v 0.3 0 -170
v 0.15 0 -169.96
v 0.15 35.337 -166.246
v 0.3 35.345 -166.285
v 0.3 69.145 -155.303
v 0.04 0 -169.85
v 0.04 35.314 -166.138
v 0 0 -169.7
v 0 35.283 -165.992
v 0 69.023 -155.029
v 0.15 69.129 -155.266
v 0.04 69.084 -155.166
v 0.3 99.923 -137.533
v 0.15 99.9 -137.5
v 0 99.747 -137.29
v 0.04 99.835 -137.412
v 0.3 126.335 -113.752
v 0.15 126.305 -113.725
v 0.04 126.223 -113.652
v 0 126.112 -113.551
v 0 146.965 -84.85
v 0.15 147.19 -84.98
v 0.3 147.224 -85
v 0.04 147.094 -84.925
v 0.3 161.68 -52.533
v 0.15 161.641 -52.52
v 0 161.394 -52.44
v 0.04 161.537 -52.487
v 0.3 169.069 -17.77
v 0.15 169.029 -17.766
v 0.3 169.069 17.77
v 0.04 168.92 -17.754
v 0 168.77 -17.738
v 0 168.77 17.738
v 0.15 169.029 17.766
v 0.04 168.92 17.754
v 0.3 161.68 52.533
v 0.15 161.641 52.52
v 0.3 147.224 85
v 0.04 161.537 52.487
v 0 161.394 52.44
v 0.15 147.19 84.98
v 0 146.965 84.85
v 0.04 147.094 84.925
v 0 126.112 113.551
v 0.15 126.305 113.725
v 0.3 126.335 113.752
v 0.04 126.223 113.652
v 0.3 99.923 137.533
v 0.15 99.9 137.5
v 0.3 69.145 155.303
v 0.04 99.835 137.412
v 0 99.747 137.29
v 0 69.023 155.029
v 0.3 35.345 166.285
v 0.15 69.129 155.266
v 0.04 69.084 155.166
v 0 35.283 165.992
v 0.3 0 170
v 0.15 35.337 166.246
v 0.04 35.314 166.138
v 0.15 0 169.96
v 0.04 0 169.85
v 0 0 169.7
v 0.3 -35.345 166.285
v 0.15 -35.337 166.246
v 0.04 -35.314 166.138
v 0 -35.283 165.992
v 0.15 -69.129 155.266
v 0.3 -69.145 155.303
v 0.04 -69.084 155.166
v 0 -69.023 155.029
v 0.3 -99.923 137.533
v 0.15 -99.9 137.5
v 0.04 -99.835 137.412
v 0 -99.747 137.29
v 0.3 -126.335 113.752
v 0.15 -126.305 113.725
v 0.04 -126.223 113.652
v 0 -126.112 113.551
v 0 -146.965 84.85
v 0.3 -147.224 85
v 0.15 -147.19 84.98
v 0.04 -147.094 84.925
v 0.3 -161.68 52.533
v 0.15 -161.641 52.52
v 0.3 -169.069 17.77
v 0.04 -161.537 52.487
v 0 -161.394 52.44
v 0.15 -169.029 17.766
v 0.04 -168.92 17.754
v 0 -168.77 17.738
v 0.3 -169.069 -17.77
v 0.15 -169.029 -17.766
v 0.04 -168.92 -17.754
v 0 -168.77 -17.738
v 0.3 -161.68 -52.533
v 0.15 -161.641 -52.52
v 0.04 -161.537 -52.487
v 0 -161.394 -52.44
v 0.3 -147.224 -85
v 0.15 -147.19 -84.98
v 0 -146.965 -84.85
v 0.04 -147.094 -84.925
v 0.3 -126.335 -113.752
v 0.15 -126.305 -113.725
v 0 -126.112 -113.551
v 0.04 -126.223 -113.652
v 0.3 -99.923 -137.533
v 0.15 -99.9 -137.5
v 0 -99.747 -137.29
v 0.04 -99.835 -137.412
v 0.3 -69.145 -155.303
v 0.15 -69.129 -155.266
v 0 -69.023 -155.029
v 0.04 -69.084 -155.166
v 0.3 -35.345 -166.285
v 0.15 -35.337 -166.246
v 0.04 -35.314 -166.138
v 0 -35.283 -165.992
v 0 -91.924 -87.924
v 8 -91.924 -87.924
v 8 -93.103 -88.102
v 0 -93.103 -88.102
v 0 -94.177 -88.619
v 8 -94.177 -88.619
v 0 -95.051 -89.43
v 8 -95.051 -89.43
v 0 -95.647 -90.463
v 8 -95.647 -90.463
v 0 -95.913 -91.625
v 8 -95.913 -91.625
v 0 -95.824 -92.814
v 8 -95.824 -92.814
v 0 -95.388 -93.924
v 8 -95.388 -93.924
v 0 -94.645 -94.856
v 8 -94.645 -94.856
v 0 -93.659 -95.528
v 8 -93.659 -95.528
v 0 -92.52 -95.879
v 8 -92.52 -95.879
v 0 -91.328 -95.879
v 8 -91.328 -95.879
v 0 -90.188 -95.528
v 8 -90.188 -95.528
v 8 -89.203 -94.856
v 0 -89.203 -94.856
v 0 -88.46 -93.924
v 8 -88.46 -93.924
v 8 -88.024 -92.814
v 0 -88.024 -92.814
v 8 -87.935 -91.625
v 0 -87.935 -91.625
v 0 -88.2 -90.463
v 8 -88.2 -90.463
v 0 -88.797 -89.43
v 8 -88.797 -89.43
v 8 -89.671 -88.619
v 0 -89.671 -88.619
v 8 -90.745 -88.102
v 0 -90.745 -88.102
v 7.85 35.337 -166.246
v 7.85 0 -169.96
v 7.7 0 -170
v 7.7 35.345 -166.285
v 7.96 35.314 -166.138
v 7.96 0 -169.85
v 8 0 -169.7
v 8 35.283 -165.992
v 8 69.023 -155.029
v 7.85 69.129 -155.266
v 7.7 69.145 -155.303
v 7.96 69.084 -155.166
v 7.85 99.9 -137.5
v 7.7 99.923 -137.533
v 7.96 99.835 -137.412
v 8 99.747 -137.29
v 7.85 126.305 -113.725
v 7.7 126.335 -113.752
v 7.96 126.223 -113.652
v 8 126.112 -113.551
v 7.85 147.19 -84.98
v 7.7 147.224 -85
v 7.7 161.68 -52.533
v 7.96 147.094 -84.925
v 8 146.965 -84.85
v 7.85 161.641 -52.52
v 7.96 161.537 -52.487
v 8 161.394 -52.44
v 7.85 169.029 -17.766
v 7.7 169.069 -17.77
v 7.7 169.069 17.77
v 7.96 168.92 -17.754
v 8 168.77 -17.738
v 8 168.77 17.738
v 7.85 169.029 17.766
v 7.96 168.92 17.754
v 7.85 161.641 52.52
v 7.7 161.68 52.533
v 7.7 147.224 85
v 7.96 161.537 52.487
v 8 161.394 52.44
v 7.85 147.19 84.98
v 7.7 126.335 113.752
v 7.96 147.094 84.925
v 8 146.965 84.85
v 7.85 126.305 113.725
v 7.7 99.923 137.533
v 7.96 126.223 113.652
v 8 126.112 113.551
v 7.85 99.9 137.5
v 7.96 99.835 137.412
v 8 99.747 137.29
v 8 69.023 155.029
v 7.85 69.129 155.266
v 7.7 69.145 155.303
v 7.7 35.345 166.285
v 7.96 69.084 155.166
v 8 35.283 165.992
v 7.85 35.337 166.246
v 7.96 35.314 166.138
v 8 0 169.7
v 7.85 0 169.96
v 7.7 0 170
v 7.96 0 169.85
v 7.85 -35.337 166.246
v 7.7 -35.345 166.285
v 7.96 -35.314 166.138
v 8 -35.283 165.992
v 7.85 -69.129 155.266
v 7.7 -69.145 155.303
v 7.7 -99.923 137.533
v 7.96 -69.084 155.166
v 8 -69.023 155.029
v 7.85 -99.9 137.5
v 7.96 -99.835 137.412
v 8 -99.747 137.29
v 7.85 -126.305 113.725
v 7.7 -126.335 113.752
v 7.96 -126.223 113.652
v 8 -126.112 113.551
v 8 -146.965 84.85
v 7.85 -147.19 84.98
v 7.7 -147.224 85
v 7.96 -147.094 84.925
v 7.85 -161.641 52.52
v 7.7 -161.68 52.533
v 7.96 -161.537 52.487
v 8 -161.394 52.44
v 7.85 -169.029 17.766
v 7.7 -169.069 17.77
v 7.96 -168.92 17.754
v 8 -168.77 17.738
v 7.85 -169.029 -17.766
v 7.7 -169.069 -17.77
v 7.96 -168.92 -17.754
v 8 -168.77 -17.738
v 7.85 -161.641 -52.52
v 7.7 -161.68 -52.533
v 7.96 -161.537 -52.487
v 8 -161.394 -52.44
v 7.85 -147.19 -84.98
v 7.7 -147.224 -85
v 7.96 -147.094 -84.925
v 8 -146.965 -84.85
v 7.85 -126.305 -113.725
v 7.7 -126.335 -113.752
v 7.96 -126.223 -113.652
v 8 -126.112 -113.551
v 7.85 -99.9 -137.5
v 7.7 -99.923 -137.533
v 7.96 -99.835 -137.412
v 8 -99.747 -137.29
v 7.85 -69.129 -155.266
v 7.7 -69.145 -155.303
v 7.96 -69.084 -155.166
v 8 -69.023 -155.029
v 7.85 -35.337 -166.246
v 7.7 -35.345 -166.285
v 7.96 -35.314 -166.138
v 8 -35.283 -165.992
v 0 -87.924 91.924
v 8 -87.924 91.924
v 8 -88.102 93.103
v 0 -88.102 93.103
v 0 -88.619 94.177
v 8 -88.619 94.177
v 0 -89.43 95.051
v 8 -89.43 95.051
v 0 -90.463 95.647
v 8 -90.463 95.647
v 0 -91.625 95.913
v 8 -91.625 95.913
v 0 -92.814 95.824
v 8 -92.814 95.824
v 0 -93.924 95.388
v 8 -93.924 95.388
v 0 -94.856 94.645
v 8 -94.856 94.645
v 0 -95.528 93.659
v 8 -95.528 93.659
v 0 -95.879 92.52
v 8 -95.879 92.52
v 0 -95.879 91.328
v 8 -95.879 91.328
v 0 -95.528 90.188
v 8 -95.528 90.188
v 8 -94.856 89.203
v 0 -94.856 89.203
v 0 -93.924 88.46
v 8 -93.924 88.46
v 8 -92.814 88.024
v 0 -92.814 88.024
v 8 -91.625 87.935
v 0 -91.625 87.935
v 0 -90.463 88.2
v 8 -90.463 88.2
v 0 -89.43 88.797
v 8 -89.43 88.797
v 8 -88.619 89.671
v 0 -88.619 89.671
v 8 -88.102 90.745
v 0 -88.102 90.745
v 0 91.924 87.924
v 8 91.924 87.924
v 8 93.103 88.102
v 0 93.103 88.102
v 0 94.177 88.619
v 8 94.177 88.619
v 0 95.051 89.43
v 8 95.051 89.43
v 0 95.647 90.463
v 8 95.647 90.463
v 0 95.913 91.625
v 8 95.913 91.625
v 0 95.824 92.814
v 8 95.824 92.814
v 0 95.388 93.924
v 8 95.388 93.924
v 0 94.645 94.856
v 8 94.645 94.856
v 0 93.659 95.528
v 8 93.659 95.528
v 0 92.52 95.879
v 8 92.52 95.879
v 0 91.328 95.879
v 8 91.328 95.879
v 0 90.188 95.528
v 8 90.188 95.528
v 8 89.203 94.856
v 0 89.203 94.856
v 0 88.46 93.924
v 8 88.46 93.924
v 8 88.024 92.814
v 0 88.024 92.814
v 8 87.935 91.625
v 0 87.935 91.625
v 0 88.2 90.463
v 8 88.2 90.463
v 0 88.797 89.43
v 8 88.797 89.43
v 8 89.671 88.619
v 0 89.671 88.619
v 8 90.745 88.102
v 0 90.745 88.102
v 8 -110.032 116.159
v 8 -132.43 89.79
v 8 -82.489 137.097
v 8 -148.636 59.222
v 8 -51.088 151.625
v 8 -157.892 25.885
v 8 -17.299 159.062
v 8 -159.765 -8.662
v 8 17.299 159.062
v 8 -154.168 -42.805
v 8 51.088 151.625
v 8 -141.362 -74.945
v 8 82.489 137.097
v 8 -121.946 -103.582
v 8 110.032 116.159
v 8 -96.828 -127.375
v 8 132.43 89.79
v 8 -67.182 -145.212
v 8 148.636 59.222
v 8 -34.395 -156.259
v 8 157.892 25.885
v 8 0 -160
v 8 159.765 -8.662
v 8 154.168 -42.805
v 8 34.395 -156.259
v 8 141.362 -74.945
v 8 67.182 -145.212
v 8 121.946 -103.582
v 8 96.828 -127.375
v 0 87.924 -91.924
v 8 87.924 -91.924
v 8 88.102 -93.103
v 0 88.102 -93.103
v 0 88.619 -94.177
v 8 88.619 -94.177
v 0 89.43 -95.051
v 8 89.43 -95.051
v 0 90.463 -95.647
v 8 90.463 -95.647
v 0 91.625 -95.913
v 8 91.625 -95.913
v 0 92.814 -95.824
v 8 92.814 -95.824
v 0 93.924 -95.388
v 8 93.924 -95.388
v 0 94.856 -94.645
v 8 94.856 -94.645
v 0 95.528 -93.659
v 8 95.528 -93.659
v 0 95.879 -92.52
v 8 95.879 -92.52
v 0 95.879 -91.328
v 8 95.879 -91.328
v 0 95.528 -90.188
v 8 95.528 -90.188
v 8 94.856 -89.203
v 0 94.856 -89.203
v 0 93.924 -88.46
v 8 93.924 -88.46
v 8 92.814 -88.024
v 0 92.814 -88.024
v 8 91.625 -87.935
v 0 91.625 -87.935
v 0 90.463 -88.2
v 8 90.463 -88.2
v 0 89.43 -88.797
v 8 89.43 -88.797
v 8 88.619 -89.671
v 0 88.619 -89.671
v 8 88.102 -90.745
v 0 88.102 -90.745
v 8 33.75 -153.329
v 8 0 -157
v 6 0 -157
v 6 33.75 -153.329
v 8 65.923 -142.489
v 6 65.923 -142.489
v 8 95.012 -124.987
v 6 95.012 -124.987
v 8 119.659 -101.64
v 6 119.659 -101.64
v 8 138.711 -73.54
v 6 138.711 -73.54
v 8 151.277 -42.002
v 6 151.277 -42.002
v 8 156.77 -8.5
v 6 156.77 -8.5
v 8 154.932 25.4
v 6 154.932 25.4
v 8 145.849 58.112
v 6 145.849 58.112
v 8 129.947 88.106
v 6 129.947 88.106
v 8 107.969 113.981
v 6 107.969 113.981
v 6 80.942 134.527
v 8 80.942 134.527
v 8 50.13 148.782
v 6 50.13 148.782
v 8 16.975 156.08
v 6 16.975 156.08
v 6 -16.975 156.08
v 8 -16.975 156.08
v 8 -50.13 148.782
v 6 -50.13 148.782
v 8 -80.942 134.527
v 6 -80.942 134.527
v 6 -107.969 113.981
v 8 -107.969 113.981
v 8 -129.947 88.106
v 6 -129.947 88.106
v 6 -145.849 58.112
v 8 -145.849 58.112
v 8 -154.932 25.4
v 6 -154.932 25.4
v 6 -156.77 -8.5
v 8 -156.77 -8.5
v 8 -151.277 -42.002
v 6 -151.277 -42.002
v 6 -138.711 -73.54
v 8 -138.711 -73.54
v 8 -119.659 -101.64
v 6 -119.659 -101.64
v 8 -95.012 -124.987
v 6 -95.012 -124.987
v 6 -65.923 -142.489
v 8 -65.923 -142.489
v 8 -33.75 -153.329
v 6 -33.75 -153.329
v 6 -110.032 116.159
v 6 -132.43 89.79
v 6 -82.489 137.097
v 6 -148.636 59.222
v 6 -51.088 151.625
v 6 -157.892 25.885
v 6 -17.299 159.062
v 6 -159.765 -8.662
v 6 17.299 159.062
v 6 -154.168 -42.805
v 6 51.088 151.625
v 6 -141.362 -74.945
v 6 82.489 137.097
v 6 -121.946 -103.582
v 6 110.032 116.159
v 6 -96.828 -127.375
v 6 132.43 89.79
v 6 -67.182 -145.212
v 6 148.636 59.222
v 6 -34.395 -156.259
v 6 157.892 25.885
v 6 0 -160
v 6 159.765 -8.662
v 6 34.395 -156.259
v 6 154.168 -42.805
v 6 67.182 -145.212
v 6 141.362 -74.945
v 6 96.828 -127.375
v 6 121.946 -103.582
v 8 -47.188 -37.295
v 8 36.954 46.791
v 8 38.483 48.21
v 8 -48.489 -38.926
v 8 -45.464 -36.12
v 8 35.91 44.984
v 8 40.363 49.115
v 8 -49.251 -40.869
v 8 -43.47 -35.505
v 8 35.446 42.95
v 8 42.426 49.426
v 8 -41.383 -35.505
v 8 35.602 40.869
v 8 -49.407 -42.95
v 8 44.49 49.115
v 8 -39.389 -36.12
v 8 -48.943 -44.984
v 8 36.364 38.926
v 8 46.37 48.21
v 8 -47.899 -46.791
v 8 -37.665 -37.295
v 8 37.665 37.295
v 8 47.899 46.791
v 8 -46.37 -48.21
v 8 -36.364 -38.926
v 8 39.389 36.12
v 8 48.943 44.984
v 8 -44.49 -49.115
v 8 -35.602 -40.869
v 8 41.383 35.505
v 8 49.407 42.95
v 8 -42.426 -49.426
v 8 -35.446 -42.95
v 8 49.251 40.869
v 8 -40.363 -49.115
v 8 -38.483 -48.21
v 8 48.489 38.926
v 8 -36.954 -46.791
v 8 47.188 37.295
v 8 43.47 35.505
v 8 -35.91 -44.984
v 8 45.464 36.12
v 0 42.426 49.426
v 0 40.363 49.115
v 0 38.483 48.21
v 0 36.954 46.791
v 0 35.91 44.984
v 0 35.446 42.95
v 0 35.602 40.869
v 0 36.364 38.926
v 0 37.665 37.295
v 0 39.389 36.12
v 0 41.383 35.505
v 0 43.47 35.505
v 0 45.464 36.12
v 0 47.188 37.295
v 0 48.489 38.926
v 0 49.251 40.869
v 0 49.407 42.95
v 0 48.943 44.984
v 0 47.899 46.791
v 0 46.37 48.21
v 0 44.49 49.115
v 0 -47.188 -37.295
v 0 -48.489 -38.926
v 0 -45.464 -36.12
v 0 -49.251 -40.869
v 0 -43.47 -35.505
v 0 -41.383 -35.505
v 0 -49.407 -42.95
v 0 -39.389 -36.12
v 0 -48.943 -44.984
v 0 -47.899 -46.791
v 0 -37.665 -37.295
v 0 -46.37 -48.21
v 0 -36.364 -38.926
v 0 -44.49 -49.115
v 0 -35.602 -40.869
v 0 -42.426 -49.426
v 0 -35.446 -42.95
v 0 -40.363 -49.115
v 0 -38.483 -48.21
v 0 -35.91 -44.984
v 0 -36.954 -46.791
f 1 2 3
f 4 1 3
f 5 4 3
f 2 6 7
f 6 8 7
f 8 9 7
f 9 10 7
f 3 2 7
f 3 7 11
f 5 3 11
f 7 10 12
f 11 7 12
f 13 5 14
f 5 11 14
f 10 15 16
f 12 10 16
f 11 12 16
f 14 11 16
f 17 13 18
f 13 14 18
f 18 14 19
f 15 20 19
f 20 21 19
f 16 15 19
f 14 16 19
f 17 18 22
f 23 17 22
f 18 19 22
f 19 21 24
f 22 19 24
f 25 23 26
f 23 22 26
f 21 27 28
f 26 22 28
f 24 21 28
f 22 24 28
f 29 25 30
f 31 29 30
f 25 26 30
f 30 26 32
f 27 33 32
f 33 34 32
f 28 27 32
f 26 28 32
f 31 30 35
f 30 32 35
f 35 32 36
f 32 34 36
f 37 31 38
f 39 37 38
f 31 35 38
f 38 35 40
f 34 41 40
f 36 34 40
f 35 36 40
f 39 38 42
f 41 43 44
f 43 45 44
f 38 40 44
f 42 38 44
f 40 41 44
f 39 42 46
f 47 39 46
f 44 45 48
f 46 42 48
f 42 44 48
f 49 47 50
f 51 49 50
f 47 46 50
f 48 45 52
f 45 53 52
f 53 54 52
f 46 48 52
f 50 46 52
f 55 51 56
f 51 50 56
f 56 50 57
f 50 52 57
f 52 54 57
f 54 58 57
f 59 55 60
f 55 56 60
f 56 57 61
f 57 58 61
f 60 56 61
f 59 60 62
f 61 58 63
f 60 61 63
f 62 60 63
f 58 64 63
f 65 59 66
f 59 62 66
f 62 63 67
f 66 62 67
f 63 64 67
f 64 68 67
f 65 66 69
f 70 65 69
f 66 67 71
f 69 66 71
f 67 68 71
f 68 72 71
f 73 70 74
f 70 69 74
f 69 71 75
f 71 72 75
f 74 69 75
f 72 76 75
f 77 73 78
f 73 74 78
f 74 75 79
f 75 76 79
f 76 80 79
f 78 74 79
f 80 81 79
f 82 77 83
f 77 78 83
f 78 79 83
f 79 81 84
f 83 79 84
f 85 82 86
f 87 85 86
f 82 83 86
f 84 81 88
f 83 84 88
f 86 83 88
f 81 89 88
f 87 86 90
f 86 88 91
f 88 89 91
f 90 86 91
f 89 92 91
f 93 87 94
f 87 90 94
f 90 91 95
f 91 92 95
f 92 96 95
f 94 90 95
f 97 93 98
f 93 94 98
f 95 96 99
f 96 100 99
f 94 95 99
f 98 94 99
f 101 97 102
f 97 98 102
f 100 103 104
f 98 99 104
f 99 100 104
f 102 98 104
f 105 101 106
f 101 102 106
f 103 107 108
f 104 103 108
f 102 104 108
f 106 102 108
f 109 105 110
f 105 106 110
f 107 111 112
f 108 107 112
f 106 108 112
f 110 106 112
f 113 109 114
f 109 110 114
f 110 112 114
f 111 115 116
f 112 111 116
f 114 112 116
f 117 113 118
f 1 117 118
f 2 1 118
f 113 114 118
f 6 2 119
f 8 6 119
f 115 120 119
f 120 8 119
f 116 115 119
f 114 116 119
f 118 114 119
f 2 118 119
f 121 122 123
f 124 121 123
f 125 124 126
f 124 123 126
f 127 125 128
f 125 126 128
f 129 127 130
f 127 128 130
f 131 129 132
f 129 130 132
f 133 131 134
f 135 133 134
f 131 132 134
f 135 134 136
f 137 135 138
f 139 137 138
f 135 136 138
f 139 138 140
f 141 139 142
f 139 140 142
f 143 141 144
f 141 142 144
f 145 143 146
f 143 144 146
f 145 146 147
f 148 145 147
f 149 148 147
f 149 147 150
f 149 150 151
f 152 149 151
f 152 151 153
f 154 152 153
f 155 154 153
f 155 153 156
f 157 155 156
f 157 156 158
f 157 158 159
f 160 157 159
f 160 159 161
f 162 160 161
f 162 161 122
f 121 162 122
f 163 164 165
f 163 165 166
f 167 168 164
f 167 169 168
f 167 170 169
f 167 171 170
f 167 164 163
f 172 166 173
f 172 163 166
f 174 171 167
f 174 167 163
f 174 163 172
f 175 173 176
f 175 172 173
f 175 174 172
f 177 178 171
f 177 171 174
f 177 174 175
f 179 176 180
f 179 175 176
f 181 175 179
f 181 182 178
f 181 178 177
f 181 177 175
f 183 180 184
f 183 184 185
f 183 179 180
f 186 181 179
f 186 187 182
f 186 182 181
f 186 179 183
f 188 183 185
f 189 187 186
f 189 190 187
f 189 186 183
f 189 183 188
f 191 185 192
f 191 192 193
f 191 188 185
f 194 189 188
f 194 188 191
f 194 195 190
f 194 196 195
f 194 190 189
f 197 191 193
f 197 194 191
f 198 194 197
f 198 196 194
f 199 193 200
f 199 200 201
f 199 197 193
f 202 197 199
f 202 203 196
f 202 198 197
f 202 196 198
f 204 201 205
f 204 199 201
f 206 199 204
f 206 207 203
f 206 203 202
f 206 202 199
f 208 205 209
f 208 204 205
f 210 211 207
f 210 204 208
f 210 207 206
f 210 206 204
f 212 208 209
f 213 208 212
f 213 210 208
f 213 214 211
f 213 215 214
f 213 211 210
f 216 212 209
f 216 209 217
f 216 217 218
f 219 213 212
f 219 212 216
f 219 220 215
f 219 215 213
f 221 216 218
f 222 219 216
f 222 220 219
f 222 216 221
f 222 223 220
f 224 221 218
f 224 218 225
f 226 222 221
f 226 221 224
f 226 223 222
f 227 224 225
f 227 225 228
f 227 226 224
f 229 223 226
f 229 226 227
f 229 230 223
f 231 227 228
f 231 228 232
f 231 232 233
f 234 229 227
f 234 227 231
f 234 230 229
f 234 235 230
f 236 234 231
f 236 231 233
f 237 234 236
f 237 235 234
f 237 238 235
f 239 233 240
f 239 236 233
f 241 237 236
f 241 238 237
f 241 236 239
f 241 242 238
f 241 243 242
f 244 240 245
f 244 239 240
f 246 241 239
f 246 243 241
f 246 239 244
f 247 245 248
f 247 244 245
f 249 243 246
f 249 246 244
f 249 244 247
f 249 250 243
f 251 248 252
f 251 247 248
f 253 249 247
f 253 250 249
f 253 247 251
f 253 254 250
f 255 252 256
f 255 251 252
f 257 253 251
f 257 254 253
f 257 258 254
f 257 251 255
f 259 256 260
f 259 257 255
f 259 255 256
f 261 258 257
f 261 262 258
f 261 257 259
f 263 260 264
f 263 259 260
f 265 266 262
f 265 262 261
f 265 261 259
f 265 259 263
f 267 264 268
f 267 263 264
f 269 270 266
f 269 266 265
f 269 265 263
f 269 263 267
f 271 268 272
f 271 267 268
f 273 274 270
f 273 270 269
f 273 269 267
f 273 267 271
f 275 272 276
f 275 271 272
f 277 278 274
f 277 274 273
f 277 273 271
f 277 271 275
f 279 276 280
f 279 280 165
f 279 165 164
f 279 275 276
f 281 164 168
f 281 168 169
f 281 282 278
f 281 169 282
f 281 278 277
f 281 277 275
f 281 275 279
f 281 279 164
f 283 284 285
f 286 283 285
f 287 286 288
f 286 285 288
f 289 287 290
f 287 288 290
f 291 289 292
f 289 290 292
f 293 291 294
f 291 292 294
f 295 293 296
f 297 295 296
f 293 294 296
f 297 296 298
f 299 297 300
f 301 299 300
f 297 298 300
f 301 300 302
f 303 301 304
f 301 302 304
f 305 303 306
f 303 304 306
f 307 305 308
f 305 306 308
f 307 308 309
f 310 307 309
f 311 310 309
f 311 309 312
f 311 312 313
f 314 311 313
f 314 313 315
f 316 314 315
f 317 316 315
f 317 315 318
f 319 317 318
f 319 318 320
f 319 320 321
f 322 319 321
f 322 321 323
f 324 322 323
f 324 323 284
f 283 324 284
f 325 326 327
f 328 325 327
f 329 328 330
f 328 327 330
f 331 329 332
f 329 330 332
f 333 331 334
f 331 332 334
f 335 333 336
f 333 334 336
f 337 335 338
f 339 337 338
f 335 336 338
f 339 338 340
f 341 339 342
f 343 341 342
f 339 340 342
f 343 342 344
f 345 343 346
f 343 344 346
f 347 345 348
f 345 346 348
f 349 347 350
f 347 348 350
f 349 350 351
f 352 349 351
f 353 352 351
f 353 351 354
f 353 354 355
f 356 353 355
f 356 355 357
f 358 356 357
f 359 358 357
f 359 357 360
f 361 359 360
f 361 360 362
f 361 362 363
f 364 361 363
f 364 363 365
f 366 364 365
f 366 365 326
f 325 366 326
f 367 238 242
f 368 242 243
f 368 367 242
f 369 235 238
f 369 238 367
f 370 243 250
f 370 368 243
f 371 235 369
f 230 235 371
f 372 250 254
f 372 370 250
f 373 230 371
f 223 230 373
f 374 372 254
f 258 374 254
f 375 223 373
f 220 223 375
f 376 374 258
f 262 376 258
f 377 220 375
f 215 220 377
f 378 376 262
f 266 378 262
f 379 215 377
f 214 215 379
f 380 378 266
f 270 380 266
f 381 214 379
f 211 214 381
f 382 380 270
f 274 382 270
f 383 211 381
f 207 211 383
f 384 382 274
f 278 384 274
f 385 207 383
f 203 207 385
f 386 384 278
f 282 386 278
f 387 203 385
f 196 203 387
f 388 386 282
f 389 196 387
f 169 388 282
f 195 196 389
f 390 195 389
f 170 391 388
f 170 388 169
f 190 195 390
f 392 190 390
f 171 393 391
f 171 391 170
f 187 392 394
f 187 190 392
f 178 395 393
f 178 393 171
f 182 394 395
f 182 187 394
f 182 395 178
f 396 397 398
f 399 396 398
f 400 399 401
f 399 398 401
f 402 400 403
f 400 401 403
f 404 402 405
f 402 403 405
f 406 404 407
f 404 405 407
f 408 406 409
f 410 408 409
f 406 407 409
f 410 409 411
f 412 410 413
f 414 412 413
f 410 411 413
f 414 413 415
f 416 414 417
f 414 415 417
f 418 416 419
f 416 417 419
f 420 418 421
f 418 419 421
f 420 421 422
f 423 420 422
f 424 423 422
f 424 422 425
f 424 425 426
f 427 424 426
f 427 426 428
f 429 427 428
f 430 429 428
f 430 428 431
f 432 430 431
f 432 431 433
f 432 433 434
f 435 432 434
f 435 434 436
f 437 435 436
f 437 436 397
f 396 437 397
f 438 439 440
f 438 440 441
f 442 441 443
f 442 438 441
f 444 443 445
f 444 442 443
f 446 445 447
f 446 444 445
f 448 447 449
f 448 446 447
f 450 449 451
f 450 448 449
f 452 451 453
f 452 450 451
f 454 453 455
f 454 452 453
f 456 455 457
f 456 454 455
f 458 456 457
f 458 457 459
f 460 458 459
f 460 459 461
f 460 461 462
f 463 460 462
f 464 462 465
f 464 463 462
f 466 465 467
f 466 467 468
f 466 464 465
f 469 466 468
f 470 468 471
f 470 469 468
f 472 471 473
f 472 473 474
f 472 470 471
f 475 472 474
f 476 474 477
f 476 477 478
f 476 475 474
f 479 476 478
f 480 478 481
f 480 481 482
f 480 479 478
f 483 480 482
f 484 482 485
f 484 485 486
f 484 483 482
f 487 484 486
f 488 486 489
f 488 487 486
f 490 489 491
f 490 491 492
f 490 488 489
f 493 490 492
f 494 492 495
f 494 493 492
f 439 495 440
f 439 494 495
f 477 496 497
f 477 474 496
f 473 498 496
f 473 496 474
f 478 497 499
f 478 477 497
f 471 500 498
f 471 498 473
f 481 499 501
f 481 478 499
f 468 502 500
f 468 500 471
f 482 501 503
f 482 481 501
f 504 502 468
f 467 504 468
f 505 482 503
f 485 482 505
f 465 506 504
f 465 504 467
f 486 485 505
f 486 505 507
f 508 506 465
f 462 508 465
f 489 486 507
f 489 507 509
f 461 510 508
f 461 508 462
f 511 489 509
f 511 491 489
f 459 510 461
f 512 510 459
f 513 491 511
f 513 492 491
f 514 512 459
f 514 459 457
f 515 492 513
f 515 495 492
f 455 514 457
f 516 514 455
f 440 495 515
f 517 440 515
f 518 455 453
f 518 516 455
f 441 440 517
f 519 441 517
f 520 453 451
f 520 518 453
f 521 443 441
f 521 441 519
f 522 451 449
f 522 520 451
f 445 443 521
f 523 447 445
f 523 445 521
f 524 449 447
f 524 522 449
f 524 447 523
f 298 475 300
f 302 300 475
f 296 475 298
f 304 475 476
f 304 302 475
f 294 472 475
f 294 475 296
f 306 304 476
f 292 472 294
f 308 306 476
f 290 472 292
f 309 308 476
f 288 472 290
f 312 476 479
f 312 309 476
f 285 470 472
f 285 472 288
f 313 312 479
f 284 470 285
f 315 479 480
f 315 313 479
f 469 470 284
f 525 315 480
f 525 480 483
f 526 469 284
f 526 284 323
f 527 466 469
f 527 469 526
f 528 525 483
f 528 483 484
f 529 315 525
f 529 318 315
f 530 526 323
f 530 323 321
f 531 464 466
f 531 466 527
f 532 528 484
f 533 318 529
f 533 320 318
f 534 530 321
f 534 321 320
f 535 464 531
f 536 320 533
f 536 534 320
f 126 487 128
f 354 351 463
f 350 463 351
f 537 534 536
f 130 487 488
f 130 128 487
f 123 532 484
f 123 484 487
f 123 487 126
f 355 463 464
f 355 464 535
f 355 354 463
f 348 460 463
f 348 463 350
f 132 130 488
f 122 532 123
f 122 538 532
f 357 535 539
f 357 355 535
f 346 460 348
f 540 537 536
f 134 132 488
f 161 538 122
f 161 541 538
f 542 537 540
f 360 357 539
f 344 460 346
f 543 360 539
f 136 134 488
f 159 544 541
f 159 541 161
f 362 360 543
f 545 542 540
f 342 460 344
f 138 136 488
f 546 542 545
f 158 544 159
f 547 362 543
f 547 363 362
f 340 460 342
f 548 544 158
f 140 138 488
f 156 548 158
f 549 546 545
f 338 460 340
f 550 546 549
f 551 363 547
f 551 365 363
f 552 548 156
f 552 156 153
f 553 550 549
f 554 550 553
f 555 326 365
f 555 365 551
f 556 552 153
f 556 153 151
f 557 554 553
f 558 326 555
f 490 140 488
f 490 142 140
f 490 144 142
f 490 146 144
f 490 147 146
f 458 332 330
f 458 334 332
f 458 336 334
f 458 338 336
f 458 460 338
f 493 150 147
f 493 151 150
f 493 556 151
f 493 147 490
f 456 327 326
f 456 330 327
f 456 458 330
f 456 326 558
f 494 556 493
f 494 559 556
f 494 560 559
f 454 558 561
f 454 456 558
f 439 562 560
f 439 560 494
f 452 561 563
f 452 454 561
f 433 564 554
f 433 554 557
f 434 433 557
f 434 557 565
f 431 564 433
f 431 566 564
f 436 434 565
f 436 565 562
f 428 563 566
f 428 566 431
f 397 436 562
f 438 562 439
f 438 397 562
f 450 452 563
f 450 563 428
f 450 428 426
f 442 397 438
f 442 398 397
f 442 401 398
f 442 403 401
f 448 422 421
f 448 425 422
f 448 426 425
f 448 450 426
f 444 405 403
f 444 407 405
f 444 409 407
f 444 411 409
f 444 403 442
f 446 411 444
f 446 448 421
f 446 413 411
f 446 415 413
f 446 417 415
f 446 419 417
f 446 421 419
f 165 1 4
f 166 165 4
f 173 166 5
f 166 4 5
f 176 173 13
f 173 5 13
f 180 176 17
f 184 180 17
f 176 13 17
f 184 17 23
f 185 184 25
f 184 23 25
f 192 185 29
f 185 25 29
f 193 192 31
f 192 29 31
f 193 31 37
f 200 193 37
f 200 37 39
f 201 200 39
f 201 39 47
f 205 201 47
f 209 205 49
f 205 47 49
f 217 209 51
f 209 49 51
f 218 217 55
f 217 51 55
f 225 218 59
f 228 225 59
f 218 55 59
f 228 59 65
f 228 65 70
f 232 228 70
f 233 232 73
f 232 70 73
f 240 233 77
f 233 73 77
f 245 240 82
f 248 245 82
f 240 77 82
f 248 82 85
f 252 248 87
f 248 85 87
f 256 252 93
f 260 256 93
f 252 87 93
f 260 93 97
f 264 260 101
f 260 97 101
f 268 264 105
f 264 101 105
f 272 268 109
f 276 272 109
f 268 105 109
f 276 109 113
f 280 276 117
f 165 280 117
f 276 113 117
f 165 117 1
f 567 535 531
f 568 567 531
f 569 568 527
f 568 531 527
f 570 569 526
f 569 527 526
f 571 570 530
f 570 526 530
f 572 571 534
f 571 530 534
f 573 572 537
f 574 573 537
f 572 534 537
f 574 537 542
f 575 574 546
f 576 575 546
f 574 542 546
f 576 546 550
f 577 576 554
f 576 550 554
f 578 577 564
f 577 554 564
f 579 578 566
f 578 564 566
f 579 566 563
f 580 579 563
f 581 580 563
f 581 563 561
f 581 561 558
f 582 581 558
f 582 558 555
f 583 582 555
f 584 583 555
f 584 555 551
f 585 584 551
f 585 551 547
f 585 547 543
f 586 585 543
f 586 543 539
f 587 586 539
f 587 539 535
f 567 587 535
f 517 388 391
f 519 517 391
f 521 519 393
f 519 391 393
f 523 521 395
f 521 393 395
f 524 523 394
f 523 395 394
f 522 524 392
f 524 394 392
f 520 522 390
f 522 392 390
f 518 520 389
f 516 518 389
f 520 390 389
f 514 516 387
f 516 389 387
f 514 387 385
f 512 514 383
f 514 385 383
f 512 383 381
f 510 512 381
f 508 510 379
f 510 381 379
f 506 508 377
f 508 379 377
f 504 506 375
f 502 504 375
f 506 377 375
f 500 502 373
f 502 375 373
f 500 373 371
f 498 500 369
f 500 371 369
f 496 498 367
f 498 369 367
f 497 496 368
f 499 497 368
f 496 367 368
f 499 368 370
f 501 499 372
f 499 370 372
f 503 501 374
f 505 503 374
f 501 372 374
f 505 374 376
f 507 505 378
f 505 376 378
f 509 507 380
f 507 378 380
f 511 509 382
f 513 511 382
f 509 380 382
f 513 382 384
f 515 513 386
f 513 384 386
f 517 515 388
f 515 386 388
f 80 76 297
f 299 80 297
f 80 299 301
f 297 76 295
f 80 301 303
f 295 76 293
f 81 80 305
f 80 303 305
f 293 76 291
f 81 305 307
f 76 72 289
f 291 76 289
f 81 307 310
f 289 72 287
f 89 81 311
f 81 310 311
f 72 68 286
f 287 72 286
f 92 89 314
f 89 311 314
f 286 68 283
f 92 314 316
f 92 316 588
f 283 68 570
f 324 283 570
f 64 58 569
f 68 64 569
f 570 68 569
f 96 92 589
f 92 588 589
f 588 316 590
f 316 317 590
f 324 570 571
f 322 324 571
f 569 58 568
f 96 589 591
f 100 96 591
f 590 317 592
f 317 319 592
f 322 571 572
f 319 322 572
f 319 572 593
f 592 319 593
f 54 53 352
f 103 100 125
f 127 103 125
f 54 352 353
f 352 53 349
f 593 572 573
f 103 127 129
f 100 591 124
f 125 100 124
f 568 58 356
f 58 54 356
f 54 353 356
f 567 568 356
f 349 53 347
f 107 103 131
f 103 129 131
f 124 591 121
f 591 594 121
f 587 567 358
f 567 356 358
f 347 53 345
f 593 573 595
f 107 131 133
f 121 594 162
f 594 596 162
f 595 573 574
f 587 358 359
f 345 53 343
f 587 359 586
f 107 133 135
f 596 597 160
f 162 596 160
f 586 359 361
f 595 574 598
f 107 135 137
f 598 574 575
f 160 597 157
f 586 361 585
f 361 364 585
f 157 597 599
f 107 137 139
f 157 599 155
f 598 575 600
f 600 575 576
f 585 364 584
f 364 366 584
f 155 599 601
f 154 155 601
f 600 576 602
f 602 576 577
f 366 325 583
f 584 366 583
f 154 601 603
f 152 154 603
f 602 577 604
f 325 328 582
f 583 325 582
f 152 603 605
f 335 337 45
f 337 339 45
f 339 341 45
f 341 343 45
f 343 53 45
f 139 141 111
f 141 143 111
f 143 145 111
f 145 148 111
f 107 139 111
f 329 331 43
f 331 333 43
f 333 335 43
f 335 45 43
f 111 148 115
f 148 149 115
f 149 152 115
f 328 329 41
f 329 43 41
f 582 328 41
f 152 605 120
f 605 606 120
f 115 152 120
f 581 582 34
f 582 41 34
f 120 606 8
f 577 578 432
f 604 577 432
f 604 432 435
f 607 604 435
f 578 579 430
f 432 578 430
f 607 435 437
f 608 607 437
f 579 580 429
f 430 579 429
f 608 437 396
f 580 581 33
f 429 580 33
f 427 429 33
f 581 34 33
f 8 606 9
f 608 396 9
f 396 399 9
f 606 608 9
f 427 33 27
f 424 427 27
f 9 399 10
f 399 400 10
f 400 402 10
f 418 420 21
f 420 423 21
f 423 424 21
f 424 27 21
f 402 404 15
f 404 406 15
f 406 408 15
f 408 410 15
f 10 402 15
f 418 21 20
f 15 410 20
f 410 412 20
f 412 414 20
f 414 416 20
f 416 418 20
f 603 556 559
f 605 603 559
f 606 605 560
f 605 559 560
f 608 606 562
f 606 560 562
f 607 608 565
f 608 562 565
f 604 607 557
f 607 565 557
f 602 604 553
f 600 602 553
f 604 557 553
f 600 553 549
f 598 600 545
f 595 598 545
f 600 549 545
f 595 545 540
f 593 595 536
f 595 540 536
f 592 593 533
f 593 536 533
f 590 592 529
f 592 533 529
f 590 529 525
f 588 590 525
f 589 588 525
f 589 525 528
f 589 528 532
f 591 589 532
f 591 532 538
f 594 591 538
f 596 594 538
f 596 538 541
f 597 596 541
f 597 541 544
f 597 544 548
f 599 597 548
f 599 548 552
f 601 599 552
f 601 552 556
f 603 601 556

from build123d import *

# Parameters (mm, degrees)
SKETCH_1_R               = 170
EXTRUDE_1_DEPTH          = 8
SKETCH_5_R               = 4
CUT_EXTRUDE_4_DEPTH      = 10
PATTERN_CIRCULAR_3_COUNT = 4
SKETCH_7_R               = 160
SKETCH_7_R_2             = 157
CUT_EXTRUDE_5_DEPTH      = 2
FILLET_1_R               = 0.3
SKETCH_9_R               = 7
CUT_EXTRUDE_7_DEPTH      = 10
PATTERN_CIRCULAR_5_COUNT = 2


with BuildPart() as part:
    # 草图1 → 凸台-拉伸1 (new body)
    with BuildSketch(Plane(origin=(0, 0, 0), x_dir=(0, 0, -1), z_dir=(1, 0, 0))):
        Circle(SKETCH_1_R)
    extrude(amount=EXTRUDE_1_DEPTH)

    # 草图5 → 切除-拉伸4 (cut)
    with BuildSketch(Plane(origin=(8, 0, 0), x_dir=(0, 0, -1), z_dir=(1, 0, 0))):
        with Locations((-91.923881554, 91.923881554)):
            Circle(SKETCH_5_R)
    cut_extrude_4 = extrude(amount=-CUT_EXTRUDE_4_DEPTH, mode=Mode.SUBTRACT)

    # 阵列(圆周)3: 切除-拉伸4 ×4 about axis
    pattern_circular_3_axis = Axis((0, 0, 0), (1, 0, 0))
    for i in range(1, PATTERN_CIRCULAR_3_COUNT):
        add(cut_extrude_4.rotate(pattern_circular_3_axis, i * 360 / PATTERN_CIRCULAR_3_COUNT), mode=Mode.SUBTRACT)

    # 草图7 → 切除-拉伸5 (cut)
    with BuildSketch(Plane(origin=(8, 0, 0), x_dir=(0, 0, -1), z_dir=(1, 0, 0))):
        Circle(SKETCH_7_R)
        Circle(SKETCH_7_R_2, mode=Mode.SUBTRACT)
    extrude(amount=-CUT_EXTRUDE_5_DEPTH, mode=Mode.SUBTRACT)

    # 圆角1
    fillet_1_edges = [part.edges().sort_by_distance(p)[0] for p in [
        (0, 0, 170),
        (8, 0, 170),
    ]]
    fillet(fillet_1_edges, radius=FILLET_1_R)

    # 草图9 → 切除-拉伸7 (cut)
    with BuildSketch(Plane(origin=(8, 0, 0), x_dir=(0, 0, -1), z_dir=(1, 0, 0))):
        with Locations((42.426406871, -42.426406871)):
            Circle(SKETCH_9_R)
    cut_extrude_7 = extrude(amount=-CUT_EXTRUDE_7_DEPTH, mode=Mode.SUBTRACT)

    # 阵列(圆周)5: 切除-拉伸7 ×2 about axis
    pattern_circular_5_axis = Axis((0, 0, 0), (1, 0, 0))
    for i in range(1, PATTERN_CIRCULAR_5_COUNT):
        add(cut_extrude_7.rotate(pattern_circular_5_axis, i * 360 / PATTERN_CIRCULAR_5_COUNT), mode=Mode.SUBTRACT)


solid = part.part
